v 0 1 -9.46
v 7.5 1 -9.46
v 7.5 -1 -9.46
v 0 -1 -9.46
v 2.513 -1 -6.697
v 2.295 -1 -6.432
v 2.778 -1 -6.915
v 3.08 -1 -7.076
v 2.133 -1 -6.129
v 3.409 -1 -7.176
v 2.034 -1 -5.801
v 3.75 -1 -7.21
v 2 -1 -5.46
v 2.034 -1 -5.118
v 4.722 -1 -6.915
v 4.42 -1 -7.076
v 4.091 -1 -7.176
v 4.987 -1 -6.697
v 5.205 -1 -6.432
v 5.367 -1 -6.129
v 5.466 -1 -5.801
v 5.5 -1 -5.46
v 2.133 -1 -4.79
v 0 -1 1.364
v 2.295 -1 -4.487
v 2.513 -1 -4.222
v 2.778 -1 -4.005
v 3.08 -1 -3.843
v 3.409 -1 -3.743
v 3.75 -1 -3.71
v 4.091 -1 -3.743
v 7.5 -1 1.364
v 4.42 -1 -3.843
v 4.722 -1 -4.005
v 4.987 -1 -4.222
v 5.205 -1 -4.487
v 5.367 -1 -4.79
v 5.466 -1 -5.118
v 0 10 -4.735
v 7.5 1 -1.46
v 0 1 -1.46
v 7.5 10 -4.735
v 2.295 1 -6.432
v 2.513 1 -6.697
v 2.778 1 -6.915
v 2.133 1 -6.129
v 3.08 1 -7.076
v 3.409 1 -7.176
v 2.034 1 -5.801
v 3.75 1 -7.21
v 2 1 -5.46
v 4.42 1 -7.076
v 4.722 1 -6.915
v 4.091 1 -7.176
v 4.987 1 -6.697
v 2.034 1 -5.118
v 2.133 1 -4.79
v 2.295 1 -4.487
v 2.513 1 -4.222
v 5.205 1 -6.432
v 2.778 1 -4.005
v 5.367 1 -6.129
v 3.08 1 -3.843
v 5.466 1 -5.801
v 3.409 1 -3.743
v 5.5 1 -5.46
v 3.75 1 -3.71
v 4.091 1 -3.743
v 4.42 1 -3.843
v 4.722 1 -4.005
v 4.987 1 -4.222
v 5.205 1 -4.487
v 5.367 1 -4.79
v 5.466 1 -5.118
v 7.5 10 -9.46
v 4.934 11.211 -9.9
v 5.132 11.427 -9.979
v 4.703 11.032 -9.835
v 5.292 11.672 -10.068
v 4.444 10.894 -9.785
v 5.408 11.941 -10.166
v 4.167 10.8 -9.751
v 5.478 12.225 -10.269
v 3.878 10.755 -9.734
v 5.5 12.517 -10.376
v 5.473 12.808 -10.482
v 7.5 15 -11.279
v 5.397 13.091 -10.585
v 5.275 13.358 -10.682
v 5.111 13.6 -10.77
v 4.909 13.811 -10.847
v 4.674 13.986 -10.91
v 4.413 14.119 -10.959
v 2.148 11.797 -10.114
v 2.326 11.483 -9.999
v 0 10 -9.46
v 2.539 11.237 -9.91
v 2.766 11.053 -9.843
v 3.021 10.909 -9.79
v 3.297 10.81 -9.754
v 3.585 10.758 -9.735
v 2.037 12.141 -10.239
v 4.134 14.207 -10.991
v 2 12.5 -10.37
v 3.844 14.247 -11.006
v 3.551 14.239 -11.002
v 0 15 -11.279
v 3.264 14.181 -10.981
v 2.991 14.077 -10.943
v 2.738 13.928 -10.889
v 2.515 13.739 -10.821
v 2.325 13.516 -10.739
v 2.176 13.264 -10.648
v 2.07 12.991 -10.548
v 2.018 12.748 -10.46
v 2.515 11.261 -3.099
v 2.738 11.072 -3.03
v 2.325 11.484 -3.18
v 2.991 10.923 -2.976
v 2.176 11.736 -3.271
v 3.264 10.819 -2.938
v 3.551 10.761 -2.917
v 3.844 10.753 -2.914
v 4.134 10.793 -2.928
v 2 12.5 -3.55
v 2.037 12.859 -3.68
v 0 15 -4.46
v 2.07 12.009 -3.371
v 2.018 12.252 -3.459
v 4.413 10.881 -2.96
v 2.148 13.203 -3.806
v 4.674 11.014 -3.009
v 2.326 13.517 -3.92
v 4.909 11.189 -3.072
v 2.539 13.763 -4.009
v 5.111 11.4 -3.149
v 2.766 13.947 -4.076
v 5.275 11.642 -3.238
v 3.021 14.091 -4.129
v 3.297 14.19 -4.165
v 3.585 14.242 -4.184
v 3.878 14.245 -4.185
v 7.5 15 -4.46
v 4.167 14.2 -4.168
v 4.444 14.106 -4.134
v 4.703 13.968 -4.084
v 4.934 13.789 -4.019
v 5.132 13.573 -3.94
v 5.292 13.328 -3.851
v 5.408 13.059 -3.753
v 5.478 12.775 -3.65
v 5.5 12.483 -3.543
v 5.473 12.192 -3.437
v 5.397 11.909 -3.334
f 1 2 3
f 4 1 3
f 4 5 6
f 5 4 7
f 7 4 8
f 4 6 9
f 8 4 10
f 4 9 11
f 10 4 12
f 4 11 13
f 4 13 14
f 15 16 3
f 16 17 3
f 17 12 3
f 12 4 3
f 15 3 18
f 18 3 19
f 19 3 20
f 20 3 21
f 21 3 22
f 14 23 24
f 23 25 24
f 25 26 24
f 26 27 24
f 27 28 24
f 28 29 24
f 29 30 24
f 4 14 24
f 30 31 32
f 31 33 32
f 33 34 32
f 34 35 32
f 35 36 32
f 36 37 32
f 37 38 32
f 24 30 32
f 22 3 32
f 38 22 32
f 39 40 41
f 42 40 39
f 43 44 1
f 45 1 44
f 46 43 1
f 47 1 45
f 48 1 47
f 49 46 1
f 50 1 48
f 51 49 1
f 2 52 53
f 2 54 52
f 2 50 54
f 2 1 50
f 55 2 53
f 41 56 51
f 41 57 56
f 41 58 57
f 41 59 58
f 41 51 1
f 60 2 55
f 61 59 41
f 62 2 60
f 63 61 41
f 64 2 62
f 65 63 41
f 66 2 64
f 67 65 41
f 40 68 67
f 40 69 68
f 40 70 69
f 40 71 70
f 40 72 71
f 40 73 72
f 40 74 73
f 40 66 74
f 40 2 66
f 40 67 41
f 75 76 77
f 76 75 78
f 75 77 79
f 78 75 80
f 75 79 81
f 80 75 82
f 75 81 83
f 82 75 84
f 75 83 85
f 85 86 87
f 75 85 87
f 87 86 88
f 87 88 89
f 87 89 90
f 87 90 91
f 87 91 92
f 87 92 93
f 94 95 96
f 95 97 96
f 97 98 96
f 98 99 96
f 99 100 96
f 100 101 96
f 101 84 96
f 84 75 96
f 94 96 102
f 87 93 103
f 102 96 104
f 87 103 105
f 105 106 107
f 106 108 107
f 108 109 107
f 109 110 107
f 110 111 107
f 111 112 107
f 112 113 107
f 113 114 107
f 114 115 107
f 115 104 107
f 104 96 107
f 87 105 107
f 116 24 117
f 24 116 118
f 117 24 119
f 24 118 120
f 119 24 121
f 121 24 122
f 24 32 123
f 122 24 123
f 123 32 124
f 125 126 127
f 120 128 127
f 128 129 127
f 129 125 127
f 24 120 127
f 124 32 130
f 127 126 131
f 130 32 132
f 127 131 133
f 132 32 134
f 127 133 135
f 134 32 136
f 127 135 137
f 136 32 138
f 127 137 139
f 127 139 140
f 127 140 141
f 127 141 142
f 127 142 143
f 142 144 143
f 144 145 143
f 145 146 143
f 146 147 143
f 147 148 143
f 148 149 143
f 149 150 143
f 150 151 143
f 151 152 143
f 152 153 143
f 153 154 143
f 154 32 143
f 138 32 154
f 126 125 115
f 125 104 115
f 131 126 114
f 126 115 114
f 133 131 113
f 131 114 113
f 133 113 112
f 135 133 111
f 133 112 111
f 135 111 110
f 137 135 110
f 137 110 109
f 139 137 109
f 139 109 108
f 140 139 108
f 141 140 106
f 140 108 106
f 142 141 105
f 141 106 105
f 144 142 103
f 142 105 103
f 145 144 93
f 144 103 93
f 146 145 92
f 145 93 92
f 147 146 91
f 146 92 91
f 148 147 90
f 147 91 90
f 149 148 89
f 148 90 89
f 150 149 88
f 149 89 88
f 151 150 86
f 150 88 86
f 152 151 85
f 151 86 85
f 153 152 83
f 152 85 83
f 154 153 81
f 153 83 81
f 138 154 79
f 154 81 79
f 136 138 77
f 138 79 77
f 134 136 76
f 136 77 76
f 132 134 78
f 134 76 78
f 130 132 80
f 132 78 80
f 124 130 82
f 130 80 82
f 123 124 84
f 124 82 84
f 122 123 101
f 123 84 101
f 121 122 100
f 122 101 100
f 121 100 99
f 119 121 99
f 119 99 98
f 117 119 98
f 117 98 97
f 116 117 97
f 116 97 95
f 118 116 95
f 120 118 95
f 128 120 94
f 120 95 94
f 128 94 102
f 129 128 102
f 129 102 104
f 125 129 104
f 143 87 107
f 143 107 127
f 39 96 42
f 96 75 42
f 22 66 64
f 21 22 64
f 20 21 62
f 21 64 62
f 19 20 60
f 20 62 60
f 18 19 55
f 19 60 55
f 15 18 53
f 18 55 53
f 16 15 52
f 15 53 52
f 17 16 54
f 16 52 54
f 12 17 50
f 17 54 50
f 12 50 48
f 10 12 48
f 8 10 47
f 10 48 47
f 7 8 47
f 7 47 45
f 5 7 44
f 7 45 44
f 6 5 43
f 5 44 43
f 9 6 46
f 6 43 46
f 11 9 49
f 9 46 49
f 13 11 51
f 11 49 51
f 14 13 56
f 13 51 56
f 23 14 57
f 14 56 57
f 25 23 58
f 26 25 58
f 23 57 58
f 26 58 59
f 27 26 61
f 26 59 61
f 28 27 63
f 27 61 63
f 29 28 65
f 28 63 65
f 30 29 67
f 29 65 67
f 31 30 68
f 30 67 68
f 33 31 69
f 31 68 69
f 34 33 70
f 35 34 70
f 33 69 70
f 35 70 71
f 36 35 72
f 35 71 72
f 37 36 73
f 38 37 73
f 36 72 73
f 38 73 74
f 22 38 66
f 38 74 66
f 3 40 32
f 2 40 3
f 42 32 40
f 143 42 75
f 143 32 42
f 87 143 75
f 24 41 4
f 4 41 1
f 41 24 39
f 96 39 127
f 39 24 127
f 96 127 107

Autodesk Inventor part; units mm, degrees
ref_plane "YZ Plane" through (0, 0, 0) normal (1, 0, 0) x (0, 1, 0)
ref_plane "XZ Plane" through (0, 0, 0) normal (0, 1, 0) x (-1, 0, 0)
ref_plane "XY Plane" through (0, 0, 0) normal (0, 0, 1) x (1, 0, 0)
sketch "Sketch1" plane through (0, 0, 0) normal (1, 0, 0) x (0, 1, 0)
  line L0 (0, 0) -> (15, -5.4596)
  line L1 (0, 0) -> (0, -9.4596)
  line L2 (15, -5.4596) -> (15, -9.4596)
  line L3 (15, -9.4596) -> (0, -9.4596)
  dimension "d12" = 70
  dimension "d17" = 15
  dimension "d18" = 4
extrude "Extrusion1" add sketch "Sketch1" along normal blind 7.5
sketch "Sketch2" plane through (7.5, 0, 0) normal (1, 0, 0) x (0, 0, -1)
  line L0 (9.4596, 0) -> (9.4596, 15) projected
  line L1 (9.4596, 1) -> (1.4596, 1)
  line L2 (0, 0) -> (9.4596, 0) projected
  line L3 (1.4596, 1) -> (4.7353, 10)
  line L4 (9.4596, 10) -> (4.7353, 10)
  line L5 (9.4596, 1) -> (9.4596, 10)
  point P0 (5.4596, 15)
  dimension "d23" = 8
  dimension "d24" = 10
  dimension "d25" = 70
  dimension "d26" = 4.7243
extrude "Extrusion2" cut sketch "Sketch2" against normal blind 10
sketch "Sketch5" plane through (0, 0, 0) normal (-1, 0, 0) x (0, 0, 1)
  line L0 (-5.4596, 15) -> (-9.4596, 15) projected
  line L1 (-9.4596, 10) -> (-4.7353, 10) projected
  line L2 (-4.7353, 10) -> (-1.4596, 1) projected
  line L3 (-1.4596, 1) -> (-9.4596, 1) projected
  line L4 (-9.4596, 1) -> (-9.4596, 0) projected
  line L5 (-9.4596, 0) -> (0, 0) projected
  line L6 (0, 0) -> (-5.4596, 15) projected
  line L7 (-5.4596, 15) -> (-9.4596, 15) projected
  line L8 (-9.4596, 15) -> (-9.4596, 10) projected
  line L9 (-9.4596, 10) -> (-11.2794, 15)
  line L10 (-5.4596, 15) -> (0, 0) projected
  line L11 (-9.4596, 10) -> (-9.4596, 15) projected
  line L12 (-9.4596, 10) -> (-9.4596, 15)
  line L13 (-9.4596, 15) -> (-11.2794, 15)
extrude "Extrusion5" add sketch "Sketch5" against normal up to surface (7.5 mm away) contours L8 L9 L13
sketch "Sketch6" plane through (7.5, 0, 0) normal (1, 0, 0) x (0, 0, -1)
  line L0 (5.4596, 15) -> (0, 0) projected
  line L1 (0, 0) -> (-0.364, -1)
  line L2 (9.4596, 0) -> (9.4596, 1) projected
  line L3 (9.4596, 0) -> (9.4596, -1)
  line L4 (0, 0) -> (9.4596, 0) projected
  line L5 (0, 0) -> (9.4596, 0)
  line L6 (9.4596, -1) -> (-0.364, -1)
  dimension "d41" = 1
  dimension "d42" = 70
extrude "Extrusion6" add sketch "Sketch6" against normal up to surface (7.5 mm away)
sketch "Sketch4" plane through (7.5, 1, -1.4596) normal (0, 1, 0) x (1, 0, 0)
  line L0 (-7.5, 0) -> (-7.5, 8) projected
  line L1 (-7.5, 8) -> (0, 8) projected
  circle A0 centre (-3.75, 4) radius 1.75
  point P0 (-7.5, -1.4596)
  point P1 (-7.5, 4)
  point P2 (-3.75, 8)
  dimension "d32" = 3.5
extrude "Extrusion4" cut sketch "Sketch4" against normal blind 10
sketch "Sketch7" plane through (7.5, 0, 0) normal (1, 0, 0) x (0, 0, -1)
  line L0 (5.4596, 15) -> (11.2794, 15) projected
  line L1 (-0.364, -1) -> (9.4596, -1) projected
  line L2 (5.4596, 15) -> (4.4596, 15)
  line L3 (-0.364, -1) -> (-1.364, -1)
  line L4 (-1.364, -1) -> (4.4596, 15)
  line L5 (5.4596, 15) -> (-0.364, -1) projected
  line L6 (5.4596, 15) -> (-0.364, -1)
  point P0 (0, 0)
  dimension "d45" = 1
  dimension "d46" = 1
extrude "Extrusion7" add sketch "Sketch7" against normal up to surface (7.5 mm away)
sketch "Sketch3" plane through (7.5, 15, -9.4596) normal (0, 0, -1) x (-1, 0, 0)
  circle A0 centre (3.75, -2.5) radius 1.75
  line L0 (7.5, 0) -> (0, 0) projected
  line L1 (7.5, 0) -> (7.5, -5) projected
  point P0 (7.5, -15)
  point P1 (3.75, 0)
  point P2 (7.5, -2.5)
  dimension "d29" = 3.5
extrude "Extrusion3" cut sketch "Sketch3" against normal blind 10 and the other way blind 5
properties part number "camera-brackets-angle"
